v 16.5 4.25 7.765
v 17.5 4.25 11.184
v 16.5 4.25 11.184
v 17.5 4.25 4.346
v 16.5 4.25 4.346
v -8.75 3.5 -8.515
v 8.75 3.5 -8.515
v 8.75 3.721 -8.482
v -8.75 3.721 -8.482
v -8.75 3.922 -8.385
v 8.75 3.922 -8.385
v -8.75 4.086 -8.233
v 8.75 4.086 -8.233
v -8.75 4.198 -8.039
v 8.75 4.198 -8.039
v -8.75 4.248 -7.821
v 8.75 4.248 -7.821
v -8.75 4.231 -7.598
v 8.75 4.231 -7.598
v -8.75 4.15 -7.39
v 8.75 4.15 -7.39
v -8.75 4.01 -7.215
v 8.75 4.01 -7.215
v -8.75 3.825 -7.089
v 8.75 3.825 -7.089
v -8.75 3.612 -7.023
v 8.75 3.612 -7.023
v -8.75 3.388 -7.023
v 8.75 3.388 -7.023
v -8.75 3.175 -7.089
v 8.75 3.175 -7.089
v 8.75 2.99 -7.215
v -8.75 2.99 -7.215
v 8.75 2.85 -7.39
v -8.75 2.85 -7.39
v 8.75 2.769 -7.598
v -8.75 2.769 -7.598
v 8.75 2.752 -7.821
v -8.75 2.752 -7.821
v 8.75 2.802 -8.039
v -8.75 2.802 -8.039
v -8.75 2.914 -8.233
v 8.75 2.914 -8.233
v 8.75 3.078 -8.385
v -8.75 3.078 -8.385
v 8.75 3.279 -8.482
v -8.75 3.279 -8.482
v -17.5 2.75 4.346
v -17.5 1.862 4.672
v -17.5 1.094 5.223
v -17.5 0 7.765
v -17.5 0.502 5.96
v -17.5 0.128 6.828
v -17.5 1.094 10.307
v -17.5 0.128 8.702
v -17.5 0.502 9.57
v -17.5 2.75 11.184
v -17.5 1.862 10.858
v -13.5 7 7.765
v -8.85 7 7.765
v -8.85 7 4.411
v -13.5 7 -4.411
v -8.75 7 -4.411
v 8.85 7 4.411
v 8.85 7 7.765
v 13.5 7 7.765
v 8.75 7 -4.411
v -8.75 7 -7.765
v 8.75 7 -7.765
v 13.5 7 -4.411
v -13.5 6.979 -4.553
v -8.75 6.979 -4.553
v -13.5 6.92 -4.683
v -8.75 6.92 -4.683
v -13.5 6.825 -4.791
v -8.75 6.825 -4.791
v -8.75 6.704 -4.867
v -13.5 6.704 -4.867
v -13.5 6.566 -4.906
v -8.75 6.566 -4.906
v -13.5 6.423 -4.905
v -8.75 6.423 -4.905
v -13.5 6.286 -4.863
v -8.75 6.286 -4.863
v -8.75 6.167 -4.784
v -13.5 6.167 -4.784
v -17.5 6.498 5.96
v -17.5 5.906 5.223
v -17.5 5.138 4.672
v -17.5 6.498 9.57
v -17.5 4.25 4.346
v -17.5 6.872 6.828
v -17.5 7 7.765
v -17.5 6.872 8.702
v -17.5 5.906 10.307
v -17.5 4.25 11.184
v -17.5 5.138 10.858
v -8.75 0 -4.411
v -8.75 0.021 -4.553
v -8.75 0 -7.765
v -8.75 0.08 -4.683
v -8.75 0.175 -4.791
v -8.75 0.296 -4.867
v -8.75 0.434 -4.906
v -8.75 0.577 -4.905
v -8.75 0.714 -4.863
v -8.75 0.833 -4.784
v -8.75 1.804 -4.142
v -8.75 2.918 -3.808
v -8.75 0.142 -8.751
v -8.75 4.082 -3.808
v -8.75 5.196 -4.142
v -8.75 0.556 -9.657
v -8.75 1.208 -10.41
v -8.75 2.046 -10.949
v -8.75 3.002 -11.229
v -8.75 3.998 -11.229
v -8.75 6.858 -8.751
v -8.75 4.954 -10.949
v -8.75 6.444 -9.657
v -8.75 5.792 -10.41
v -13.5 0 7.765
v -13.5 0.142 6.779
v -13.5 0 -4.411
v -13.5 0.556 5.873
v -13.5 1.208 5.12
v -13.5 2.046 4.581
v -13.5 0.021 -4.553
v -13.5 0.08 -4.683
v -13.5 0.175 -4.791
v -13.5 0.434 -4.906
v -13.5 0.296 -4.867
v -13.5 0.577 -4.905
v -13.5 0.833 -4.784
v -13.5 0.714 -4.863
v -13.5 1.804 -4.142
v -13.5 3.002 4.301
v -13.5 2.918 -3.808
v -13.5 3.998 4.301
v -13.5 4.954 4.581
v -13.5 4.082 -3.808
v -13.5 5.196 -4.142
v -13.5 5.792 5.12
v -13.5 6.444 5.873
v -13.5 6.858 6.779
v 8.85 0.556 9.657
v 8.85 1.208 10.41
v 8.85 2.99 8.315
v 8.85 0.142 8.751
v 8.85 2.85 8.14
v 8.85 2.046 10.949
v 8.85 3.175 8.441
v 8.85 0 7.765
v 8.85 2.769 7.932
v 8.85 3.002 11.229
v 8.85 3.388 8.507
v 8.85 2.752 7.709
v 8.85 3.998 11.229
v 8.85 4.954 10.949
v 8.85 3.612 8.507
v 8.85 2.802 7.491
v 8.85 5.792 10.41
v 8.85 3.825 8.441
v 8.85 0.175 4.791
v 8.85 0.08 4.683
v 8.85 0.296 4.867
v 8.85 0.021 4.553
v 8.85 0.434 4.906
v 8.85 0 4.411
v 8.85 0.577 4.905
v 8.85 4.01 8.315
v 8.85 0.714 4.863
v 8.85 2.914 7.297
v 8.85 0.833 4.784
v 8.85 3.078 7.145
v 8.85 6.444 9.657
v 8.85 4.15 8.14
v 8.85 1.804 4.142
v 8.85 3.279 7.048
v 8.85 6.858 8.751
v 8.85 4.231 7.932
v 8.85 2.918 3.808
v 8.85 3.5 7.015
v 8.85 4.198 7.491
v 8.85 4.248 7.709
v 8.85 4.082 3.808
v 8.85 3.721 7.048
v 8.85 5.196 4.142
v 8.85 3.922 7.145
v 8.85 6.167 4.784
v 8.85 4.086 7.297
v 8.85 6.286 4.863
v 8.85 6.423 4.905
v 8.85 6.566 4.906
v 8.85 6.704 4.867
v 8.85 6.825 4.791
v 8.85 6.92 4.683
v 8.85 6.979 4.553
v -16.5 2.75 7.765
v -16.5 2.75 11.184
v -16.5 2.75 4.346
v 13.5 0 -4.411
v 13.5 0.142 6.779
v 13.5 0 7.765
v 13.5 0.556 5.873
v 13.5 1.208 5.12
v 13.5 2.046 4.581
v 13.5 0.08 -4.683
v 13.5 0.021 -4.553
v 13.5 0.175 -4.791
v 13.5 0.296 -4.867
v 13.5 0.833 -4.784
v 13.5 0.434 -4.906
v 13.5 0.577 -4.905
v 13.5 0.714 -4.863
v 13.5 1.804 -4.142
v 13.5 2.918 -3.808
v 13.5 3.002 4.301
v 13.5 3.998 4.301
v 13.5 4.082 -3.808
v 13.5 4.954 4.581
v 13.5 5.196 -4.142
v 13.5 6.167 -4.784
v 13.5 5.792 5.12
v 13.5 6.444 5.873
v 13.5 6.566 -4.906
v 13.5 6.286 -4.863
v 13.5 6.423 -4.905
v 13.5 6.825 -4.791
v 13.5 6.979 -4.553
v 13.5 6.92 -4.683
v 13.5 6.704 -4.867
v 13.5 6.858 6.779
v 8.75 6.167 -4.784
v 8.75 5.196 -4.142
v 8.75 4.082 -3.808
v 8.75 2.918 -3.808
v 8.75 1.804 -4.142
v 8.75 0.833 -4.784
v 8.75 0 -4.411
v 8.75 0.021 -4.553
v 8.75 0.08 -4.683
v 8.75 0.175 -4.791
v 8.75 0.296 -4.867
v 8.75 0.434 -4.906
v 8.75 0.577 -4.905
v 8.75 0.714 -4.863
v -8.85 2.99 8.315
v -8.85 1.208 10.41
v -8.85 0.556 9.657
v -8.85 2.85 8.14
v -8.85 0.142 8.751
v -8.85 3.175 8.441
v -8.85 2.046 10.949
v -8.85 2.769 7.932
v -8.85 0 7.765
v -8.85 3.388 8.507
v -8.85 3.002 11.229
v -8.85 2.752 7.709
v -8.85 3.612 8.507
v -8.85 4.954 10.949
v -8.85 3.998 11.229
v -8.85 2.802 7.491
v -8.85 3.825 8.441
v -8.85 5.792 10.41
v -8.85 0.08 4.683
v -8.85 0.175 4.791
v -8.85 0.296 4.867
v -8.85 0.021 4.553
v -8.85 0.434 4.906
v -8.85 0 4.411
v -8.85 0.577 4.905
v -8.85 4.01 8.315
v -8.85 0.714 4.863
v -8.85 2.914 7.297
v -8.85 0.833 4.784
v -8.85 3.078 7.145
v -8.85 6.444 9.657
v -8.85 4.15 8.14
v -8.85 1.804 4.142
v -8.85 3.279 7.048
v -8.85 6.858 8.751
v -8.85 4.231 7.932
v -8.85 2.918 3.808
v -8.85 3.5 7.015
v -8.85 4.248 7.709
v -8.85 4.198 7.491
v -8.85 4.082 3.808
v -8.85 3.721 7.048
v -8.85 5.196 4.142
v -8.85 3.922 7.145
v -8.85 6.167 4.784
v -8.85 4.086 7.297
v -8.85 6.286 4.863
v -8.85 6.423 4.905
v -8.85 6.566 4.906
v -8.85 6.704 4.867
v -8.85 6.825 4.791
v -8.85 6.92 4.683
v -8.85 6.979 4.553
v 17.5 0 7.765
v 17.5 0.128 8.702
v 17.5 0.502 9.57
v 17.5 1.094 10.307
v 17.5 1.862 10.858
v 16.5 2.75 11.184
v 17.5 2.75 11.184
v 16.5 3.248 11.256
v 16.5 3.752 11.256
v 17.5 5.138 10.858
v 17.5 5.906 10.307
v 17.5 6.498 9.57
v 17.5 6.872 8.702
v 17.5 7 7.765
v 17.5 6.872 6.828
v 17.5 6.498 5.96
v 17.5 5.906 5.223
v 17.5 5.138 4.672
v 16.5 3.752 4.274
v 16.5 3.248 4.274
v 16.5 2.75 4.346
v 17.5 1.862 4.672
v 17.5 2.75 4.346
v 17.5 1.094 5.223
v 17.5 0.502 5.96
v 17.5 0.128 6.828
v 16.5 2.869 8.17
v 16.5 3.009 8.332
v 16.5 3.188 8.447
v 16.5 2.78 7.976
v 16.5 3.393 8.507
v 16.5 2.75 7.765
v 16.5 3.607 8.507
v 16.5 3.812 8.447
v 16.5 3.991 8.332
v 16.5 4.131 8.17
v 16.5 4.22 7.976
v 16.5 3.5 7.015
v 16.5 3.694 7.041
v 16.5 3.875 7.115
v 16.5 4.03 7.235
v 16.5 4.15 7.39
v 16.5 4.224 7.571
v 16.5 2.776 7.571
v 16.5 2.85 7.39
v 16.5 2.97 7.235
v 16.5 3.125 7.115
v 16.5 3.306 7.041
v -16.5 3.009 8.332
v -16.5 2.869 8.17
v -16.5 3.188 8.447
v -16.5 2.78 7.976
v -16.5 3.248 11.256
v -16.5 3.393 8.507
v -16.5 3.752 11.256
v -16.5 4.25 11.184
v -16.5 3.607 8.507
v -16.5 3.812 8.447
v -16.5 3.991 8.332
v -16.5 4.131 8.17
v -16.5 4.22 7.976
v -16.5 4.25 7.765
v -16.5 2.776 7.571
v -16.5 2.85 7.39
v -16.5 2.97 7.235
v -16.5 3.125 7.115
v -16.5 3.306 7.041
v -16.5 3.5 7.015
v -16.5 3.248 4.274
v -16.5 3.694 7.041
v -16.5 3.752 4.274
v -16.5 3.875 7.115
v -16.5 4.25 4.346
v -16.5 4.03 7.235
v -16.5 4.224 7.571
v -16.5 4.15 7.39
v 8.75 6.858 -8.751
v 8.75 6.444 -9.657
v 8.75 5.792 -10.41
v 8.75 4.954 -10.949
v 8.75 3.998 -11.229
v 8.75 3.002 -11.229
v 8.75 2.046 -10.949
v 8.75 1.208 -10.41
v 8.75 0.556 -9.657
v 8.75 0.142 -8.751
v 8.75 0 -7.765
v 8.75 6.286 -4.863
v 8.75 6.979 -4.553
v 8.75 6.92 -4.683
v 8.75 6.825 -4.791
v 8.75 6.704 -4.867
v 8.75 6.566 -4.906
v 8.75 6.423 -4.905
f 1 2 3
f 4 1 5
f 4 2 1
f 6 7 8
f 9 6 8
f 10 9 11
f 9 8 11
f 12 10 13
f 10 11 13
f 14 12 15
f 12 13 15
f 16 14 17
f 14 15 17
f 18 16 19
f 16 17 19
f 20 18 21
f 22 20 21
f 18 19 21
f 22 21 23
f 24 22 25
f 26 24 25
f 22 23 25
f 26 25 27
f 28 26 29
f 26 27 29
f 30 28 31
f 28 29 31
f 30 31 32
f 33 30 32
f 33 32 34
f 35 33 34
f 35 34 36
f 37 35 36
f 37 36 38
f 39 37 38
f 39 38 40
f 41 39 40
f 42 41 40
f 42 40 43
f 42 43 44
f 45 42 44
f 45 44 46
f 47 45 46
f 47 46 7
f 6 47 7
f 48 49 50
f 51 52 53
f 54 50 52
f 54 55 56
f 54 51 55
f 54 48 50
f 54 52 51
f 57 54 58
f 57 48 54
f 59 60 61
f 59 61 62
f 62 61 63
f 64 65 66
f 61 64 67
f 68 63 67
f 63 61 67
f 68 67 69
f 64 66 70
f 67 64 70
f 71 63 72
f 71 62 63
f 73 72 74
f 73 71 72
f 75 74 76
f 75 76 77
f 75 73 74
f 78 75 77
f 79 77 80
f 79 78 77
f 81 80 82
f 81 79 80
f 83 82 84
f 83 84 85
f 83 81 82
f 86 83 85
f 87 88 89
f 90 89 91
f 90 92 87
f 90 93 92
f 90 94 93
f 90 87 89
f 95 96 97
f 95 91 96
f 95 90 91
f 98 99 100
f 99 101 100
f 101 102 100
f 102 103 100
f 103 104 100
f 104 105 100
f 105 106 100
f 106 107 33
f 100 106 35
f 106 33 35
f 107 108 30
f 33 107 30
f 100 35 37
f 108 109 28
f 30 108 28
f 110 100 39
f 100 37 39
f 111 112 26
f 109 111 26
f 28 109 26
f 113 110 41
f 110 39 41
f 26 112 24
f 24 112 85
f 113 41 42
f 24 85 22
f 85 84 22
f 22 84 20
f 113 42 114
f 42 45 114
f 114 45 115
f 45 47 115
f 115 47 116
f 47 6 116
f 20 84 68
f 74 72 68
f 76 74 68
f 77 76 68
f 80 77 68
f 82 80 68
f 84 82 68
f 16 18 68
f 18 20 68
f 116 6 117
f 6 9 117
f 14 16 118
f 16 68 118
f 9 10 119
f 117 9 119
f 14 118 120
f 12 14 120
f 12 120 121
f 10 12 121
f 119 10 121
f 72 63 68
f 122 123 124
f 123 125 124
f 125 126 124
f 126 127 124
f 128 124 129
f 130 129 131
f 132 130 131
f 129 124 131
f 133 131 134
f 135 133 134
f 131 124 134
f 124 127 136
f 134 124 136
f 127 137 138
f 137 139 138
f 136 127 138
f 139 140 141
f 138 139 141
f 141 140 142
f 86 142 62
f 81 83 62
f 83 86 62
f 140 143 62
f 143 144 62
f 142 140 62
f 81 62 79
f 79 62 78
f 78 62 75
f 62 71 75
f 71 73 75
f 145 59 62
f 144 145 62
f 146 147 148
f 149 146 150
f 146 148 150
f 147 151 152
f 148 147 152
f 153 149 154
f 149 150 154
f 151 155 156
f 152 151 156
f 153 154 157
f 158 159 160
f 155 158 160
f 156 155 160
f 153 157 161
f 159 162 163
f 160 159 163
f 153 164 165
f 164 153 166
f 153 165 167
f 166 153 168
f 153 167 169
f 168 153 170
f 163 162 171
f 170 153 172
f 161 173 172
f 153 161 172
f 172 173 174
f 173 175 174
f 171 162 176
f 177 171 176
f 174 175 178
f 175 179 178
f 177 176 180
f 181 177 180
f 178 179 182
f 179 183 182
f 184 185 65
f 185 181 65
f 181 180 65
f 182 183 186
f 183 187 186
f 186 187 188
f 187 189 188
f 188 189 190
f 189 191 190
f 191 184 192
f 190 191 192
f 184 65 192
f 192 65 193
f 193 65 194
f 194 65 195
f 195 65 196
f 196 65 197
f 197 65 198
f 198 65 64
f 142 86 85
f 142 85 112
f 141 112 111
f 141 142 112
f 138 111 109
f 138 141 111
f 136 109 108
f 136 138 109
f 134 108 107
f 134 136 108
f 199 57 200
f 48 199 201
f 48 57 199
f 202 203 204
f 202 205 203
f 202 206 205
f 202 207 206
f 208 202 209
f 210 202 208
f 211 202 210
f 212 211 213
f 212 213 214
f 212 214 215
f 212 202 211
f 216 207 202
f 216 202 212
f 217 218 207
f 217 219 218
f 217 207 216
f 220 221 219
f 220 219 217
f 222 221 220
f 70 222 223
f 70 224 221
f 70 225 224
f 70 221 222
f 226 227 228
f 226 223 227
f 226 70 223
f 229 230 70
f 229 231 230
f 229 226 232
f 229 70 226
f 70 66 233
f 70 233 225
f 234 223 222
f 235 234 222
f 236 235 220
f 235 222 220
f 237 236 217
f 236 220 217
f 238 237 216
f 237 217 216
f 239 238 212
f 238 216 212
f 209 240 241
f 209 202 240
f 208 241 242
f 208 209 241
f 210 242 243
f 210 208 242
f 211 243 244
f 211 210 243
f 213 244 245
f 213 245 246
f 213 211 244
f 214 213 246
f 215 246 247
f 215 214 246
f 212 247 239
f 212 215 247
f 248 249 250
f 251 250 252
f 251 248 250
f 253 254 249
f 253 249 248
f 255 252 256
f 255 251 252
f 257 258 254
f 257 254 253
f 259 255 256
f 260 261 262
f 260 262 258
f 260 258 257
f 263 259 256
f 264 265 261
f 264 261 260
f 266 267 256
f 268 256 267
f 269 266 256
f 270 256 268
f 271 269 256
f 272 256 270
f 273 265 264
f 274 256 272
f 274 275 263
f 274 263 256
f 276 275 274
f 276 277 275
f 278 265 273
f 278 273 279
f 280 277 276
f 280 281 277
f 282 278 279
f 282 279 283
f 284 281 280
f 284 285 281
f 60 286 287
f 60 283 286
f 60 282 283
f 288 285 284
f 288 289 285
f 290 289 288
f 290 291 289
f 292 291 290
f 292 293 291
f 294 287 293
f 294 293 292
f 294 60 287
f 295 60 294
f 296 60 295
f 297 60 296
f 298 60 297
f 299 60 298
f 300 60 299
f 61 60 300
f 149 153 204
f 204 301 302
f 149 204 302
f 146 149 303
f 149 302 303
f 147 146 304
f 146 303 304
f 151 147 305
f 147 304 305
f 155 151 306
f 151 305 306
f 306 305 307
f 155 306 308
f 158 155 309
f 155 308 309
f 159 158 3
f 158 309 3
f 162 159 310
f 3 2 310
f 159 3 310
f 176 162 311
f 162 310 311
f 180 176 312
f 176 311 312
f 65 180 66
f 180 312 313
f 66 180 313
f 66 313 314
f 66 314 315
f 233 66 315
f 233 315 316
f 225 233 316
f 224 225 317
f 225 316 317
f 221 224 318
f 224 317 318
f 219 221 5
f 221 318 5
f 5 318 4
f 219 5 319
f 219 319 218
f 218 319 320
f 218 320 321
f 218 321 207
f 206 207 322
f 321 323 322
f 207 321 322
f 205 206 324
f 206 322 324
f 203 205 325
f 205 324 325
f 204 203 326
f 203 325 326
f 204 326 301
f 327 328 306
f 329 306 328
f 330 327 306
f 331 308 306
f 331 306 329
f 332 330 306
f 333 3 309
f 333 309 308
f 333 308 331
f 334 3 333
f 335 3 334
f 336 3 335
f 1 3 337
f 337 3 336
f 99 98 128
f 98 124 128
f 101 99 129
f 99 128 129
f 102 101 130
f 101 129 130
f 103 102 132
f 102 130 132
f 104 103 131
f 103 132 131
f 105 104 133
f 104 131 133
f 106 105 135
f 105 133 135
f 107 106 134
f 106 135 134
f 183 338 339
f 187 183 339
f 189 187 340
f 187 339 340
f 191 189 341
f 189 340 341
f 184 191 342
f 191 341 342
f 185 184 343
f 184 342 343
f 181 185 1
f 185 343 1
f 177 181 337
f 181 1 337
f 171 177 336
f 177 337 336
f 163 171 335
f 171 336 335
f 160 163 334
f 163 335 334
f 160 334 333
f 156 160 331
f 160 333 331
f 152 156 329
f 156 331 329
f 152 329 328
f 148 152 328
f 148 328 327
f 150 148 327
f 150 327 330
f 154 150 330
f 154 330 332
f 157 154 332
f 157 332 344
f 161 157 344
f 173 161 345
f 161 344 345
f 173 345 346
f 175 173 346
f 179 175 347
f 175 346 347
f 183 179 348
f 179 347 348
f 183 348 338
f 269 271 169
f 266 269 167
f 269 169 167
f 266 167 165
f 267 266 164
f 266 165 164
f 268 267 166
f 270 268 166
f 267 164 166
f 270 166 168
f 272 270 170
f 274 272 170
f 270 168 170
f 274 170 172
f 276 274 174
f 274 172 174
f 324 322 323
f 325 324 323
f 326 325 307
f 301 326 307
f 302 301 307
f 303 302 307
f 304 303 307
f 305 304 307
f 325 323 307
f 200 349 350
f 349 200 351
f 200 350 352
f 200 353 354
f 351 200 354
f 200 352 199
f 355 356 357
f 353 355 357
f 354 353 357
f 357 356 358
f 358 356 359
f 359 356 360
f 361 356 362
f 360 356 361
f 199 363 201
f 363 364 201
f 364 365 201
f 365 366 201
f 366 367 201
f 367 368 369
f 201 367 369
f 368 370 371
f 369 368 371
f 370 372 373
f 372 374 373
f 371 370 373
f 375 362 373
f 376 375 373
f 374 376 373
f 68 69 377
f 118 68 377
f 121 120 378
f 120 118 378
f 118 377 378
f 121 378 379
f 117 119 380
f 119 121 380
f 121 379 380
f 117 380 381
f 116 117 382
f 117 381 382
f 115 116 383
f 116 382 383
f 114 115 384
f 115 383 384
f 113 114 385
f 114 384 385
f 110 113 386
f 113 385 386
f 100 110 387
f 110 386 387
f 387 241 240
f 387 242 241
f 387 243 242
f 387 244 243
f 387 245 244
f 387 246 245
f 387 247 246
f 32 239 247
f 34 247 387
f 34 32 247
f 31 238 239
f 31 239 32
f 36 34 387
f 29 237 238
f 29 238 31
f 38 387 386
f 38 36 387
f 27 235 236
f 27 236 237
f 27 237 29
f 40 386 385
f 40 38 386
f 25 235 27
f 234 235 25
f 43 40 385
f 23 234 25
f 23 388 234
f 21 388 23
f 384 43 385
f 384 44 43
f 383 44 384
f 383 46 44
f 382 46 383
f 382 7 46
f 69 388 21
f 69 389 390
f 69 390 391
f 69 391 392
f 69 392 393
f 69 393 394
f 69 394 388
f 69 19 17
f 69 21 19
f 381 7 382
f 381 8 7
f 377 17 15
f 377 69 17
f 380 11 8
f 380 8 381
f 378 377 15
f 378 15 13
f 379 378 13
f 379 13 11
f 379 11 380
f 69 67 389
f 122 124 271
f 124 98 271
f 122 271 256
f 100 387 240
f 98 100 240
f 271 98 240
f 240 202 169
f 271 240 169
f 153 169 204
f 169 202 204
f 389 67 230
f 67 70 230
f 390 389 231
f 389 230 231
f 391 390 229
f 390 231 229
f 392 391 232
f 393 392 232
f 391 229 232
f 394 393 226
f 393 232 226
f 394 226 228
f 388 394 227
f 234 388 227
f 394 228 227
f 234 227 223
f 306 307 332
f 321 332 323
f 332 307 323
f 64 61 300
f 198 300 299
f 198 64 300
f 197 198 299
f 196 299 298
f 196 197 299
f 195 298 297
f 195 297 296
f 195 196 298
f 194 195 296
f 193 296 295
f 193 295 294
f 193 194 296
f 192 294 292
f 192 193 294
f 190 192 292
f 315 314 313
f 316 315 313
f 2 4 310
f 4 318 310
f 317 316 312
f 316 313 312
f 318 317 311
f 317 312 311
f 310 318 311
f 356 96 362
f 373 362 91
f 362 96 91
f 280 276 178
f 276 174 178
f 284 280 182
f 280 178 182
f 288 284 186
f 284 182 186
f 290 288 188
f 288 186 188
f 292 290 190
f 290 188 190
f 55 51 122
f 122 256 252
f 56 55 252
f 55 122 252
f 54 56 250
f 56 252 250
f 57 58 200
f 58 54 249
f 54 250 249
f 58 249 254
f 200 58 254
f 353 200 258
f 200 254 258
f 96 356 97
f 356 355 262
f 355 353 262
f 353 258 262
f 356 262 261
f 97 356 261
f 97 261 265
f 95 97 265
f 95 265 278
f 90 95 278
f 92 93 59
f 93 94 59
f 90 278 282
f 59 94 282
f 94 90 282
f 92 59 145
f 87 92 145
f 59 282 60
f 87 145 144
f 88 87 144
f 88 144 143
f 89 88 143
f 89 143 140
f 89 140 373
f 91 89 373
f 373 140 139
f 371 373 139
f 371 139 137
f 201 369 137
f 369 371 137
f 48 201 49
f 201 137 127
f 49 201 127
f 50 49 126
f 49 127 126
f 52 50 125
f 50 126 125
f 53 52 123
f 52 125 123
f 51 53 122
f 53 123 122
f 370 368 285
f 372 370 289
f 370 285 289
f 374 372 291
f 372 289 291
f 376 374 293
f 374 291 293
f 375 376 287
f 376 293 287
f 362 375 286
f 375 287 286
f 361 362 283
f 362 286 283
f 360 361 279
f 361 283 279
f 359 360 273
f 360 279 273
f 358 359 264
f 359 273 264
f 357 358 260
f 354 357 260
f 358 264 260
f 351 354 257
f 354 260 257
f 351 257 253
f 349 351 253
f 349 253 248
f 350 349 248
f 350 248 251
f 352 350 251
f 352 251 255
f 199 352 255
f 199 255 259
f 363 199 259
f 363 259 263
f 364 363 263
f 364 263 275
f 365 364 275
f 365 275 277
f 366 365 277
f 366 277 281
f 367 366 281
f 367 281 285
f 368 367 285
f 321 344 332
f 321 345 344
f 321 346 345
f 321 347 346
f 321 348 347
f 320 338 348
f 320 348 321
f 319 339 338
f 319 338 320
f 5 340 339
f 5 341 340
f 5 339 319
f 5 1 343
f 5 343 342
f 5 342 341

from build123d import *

# Parameters (mm, degrees)
EXTRUDE_1_DEPTH     = 17.5
SKETCH_3_W          = 24
SKETCH_3_H          = 9
SKETCH_3_R          = 3.5
CUT_EXTRUDE_1_DEPTH = 4
SKETCH_6_R          = 4
CUT_EXTRUDE_2_DEPTH = 8.85
SKETCH_7_R          = 4
CUT_EXTRUDE_3_DEPTH = 4.75
SKETCH_9_W          = 7.2
SKETCH_9_H          = 1.5
CUT_EXTRUDE_5_DEPTH = 1
FILLET_1_R          = 0.5
SKETCH_8_R          = 0.75
CUT_EXTRUDE_4_DEPTH = 38.428601697


with BuildPart() as part:
    # Эскиз1 → Бобышка-Вытянуть1 (new, symmetric)
    with BuildSketch(Plane(origin=(0, 0, 0), x_dir=(0, 0, -1), z_dir=(1, 0, 0))):
        with BuildLine():
            Line((-7.765, 7), (7.765, 7))
            ThreePointArc((7.765, 7), (11.265, 3.5), (7.765, 0))
            Line((7.765, 0), (-7.765, 0))
            ThreePointArc((-7.765, 0), (-11.265, 3.5), (-7.765, 7))
        make_face()
    extrude(amount=EXTRUDE_1_DEPTH, both=True)

    # Эскиз3 → Вырез-Вытянуть1 (cut)
    with BuildSketch(Plane(origin=(17.5, 0, 0), x_dir=(0, 0, -1), z_dir=(1, 0, 0))):
        with Locations((0, 3.5)):
            Rectangle(SKETCH_3_W, SKETCH_3_H)
        with Locations(Location((-7.765, 3.5, 0), (0, 0, 90))):
            Circle(SKETCH_3_R, mode=Mode.SUBTRACT)
    cut_extrude_1 = extrude(amount=-CUT_EXTRUDE_1_DEPTH, mode=Mode.SUBTRACT)

    # Зеркальное отражение1: Вырез-Вытянуть1 across plane
    add(cut_extrude_1.mirror(Plane(origin=(0, 0, 0), x_dir=(0, 0, 1), z_dir=(1, 0, 0))), mode=Mode.SUBTRACT)

    # Эскиз6 → Вырез-Вытянуть2 (cut, symmetric)
    with BuildSketch(Plane(origin=(0, 0, 0), x_dir=(0, 0, -1), z_dir=(1, 0, 0))):
        with Locations((-7.765, 3.5)):
            Circle(SKETCH_6_R)
    extrude(amount=CUT_EXTRUDE_2_DEPTH, both=True, mode=Mode.SUBTRACT)

    # Эскиз7 → Вырез-Вытянуть3 (cut)
    with BuildSketch(Plane(origin=(13.5, 0, 0), x_dir=(0, 0, -1), z_dir=(1, 0, 0))):
        with Locations((7.765, 3.5)):
            Circle(SKETCH_7_R)
    cut_extrude_3 = extrude(amount=-CUT_EXTRUDE_3_DEPTH, mode=Mode.SUBTRACT)

    # Эскиз9 → Вырез-Вытянуть5 (cut)
    with BuildSketch(Plane(origin=(17.5, 0, 0), x_dir=(0, 0, -1), z_dir=(1, 0, 0))):
        with Locations((-7.765, 3.5)):
            Rectangle(SKETCH_9_W, SKETCH_9_H)
    cut_extrude_5 = extrude(amount=-CUT_EXTRUDE_5_DEPTH, mode=Mode.SUBTRACT)

    # Зеркальное отражение2: Вырез-Вытянуть3, Вырез-Вытянуть5 across plane
    add(cut_extrude_3.mirror(Plane(origin=(0, 0, 0), x_dir=(0, 0, 1), z_dir=(1, 0, 0))), mode=Mode.SUBTRACT)
    add(cut_extrude_5.mirror(Plane(origin=(0, 0, 0), x_dir=(0, 0, 1), z_dir=(1, 0, 0))), mode=Mode.SUBTRACT)

    # Скругление1
    fillet_1_edges = [part.edges().sort_by_distance(p)[0] for p in [
        (-11.125, 0, -5.828508327),
        (-11.125, 7, -5.828508327),
        (0, 7, 5.828508327),
        (0, 0, 5.828508327),
        (11.125, 0, -5.828508327),
        (11.125, 7, -5.828508327),
    ]]
    fillet(fillet_1_edges, radius=FILLET_1_R)

    # Эскиз8 → Вырез-Вытянуть4 (cut, through all)
    with BuildSketch(Plane(origin=(17.5, 0, 0), x_dir=(0, 0, -1), z_dir=(1, 0, 0))):
        with Locations((-7.765, 3.5)):
            Circle(SKETCH_8_R)
        with Locations((7.765, 3.5)):
            Circle(SKETCH_8_R)
    extrude(amount=-CUT_EXTRUDE_4_DEPTH, mode=Mode.SUBTRACT)


solid = part.part
